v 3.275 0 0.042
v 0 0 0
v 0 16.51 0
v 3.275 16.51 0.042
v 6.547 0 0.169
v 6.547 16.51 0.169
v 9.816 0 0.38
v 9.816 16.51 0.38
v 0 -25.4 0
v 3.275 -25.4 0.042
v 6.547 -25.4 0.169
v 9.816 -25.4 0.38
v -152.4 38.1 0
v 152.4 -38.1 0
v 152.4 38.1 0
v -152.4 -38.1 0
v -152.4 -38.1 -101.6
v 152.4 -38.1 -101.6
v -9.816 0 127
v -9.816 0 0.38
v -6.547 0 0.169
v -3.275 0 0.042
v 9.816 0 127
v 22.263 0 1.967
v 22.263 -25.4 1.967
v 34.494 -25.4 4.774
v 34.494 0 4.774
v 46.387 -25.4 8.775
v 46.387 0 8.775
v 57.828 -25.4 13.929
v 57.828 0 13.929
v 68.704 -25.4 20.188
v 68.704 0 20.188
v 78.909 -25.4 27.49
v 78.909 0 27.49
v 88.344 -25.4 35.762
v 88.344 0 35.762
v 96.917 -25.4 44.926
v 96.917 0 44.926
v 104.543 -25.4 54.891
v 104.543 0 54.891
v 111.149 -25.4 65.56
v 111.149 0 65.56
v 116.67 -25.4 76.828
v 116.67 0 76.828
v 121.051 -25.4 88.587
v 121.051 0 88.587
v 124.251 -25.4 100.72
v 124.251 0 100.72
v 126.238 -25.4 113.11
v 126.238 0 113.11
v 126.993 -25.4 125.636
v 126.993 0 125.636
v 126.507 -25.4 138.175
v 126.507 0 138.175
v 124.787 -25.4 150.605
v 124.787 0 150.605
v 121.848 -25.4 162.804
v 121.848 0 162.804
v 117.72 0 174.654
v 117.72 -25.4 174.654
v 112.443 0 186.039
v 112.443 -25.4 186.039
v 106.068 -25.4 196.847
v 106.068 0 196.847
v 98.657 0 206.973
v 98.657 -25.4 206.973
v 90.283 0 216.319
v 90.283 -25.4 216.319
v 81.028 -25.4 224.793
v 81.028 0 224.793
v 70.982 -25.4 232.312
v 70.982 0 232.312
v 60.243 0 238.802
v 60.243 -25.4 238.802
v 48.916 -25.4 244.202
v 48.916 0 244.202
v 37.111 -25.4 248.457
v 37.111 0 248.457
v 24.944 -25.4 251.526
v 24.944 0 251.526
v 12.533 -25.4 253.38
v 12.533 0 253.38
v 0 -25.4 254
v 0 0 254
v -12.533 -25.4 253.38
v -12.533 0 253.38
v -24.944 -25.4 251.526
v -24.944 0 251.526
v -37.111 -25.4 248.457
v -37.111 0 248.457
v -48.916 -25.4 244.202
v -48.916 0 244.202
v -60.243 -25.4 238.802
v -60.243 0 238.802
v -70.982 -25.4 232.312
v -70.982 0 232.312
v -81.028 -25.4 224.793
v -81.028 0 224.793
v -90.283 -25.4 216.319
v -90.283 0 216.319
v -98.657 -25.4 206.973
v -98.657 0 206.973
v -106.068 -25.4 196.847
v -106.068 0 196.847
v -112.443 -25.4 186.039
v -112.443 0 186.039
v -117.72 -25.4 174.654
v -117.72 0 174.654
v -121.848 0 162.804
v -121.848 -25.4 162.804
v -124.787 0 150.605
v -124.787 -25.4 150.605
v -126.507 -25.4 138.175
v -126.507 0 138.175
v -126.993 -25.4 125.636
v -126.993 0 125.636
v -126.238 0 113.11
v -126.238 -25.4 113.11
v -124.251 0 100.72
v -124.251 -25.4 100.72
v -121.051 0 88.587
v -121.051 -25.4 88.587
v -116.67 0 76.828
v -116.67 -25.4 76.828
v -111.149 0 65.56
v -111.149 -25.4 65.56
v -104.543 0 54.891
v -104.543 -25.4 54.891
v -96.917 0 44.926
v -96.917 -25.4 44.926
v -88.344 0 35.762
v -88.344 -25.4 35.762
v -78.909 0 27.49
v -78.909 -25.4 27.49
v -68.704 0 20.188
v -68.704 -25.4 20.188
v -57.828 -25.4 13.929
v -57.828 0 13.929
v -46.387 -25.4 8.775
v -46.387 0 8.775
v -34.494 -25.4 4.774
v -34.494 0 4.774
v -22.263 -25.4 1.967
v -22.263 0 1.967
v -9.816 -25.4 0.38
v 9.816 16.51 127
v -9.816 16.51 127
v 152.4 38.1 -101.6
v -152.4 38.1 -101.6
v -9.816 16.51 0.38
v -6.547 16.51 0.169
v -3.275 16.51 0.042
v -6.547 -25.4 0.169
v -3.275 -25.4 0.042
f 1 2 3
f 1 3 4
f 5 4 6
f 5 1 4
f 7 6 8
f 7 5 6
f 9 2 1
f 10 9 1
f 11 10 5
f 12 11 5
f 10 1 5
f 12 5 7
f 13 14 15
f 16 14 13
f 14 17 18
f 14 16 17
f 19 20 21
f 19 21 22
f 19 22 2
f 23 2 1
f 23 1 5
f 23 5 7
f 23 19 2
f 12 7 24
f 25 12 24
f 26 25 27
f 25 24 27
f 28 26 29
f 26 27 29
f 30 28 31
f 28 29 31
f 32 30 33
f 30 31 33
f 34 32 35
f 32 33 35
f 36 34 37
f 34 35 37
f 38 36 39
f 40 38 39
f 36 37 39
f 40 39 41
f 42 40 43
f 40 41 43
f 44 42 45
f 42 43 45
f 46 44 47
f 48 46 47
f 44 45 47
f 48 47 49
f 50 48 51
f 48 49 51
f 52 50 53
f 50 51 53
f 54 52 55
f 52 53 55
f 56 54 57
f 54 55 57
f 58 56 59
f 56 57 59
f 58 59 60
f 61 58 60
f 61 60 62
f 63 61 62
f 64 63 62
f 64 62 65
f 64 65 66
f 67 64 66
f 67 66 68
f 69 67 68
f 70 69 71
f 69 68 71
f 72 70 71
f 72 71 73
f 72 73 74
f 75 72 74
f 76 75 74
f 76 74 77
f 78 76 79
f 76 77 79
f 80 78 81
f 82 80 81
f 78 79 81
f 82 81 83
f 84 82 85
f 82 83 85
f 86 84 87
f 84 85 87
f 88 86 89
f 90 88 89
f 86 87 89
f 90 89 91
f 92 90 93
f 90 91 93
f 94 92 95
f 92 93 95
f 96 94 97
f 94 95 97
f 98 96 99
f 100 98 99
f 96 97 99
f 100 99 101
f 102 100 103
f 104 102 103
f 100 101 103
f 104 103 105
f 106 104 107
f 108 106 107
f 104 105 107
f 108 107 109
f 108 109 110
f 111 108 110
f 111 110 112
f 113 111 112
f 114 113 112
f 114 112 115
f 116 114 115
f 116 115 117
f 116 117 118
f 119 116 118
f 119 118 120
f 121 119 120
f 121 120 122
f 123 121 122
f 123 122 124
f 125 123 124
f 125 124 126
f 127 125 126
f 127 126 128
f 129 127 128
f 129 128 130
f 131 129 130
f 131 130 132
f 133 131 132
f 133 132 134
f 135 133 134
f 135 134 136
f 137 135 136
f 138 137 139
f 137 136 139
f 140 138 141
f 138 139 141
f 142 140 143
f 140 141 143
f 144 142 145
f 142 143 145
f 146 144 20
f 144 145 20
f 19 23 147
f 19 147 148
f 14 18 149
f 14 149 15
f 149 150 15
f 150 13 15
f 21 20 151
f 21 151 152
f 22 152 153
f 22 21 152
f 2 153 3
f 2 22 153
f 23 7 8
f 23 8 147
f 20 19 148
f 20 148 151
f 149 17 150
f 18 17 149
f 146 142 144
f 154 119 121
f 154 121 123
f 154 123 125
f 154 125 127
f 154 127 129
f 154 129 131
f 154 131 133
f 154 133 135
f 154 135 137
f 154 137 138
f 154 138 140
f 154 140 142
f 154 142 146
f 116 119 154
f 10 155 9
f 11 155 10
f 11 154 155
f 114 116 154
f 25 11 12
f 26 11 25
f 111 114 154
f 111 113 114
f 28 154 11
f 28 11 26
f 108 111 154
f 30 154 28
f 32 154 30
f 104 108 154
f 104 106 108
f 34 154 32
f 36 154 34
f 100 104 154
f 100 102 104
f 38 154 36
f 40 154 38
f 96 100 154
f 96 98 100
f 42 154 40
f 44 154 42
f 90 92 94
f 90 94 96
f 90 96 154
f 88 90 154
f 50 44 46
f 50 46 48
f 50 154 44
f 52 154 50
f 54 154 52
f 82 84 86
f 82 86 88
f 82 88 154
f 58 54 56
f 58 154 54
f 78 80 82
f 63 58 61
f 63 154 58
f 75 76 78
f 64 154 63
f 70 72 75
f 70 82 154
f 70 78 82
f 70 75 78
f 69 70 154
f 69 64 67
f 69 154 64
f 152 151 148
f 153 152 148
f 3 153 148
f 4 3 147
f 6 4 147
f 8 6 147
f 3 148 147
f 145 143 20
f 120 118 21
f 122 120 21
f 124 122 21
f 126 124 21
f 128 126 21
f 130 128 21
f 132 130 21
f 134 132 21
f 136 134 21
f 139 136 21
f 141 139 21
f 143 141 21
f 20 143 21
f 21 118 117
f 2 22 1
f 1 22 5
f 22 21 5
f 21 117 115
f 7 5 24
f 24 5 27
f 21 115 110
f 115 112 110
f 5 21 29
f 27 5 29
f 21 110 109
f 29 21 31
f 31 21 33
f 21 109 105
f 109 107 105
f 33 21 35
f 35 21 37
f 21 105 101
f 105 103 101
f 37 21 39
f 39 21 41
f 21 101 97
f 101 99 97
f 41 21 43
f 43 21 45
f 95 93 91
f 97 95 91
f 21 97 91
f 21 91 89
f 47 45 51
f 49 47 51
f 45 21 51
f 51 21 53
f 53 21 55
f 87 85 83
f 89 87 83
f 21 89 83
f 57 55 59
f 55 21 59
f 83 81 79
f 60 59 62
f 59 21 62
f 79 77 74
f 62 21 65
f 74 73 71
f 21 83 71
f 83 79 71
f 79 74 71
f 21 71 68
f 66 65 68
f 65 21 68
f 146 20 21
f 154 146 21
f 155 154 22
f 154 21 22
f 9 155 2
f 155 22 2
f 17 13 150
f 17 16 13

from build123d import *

# Parameters (mm, degrees)
F1_DEPTH = 38.1
F2_DEPTH = 16.51
F3_DEPTH = 25.4


with BuildPart() as f1:
    # F0 (on Front) → F1 (new body, symmetric)
    with BuildSketch(Plane.XZ):
        Polygon((-152.4, -101.6), (152.4, -101.6), (152.4, 0), (9.815774858, 0), (0, 0), (-9.815774858, 0), (-152.4, 0), align=None)
    extrude(amount=F1_DEPTH, both=True)


with BuildPart() as f2:
    # F0 (on Front) → F2 (new body)
    with BuildSketch(Plane.XZ):
        with BuildLine():
            Line((0, 127), (0, 0))
            ThreePointArc((0, 0), (4.9115618074, 0.0950097096), (9.815774858, 0.3798966833))
            Line((9.815774858, 0.3798966833), (9.815774858, 127))
            Line((9.815774858, 127), (0, 127))
        make_face()
        with BuildLine():
            ThreePointArc((-9.815774858, 0.3798966833), (-4.9115618074, 0.0950097096), (0, 0))
            Line((0, 0), (0, 127))
            Line((0, 127), (-9.815774858, 127))
            Line((-9.815774858, 127), (-9.815774858, 0.3798966833))
        make_face()
    extrude(amount=-F2_DEPTH)


with BuildPart() as f3:
    # F0 (on Front) → F3 (new body)
    with BuildSketch(Plane.XZ):
        with BuildLine():
            Line((9.815774858, 127), (9.815774858, 0.3798966833))
            ThreePointArc((9.815774858, 0.3798966833), (93.208377861, 40.7376194595), (127, 127))
            ThreePointArc((127, 127), (-86.2623805405, 220.208377861), (-9.815774858, 0.3798966833))
            Line((-9.815774858, 0.3798966833), (-9.815774858, 127))
            Line((-9.815774858, 127), (0, 127))
            Line((0, 127), (9.815774858, 127))
        make_face()
        with BuildLine():
            ThreePointArc((-9.815774858, 0.3798966833), (-4.9115618074, 0.0950097096), (0, 0))
            Line((0, 0), (0, 127))
            Line((0, 127), (-9.815774858, 127))
            Line((-9.815774858, 127), (-9.815774858, 0.3798966833))
        make_face()
        with BuildLine():
            Line((0, 127), (0, 0))
            ThreePointArc((0, 0), (4.9115618074, 0.0950097096), (9.815774858, 0.3798966833))
            Line((9.815774858, 0.3798966833), (9.815774858, 127))
            Line((9.815774858, 127), (0, 127))
        make_face()
    extrude(amount=F3_DEPTH)


solid = Compound([f1.part, f2.part, f3.part])
